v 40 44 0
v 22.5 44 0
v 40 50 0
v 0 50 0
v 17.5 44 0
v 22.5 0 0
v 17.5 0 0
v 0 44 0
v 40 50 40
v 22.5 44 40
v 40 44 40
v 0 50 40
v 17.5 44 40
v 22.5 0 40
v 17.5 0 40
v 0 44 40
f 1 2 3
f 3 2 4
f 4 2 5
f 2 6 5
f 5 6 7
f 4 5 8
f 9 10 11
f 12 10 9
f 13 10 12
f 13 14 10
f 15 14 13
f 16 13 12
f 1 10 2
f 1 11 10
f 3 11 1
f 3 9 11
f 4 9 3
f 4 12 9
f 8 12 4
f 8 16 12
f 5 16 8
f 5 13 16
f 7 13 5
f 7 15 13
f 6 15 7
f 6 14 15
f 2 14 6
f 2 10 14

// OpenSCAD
$fn = 32;

// ----------------------------------------------------------------------
// Structural section: tee 40 x 50 mm
// ----------------------------------------------------------------------

// --- parameters (mm) ---
sec_w = 40;               // tee width, X
sec_h = 50;               // tee height, Y
flange_t = 6;             // top flange thickness
web_t = 5;                // web thickness
plate_t = 40;             // cut length, Z (extrusion height)
fit_tol = 0.05;           // declared fit tolerance (prompt contract)
free_tol = 0.2;           // declared free tolerance (prompt contract)

profile = [[17.5, 0], [22.5, 0], [22.5, 44], [40, 44], [40, 50], [0, 50], [0, 44], [17.5, 44]];  // primary outline, 8 points, counter clockwise

// --- the one profile operation ---
linear_extrude(height = plate_t) polygon(points = profile);
